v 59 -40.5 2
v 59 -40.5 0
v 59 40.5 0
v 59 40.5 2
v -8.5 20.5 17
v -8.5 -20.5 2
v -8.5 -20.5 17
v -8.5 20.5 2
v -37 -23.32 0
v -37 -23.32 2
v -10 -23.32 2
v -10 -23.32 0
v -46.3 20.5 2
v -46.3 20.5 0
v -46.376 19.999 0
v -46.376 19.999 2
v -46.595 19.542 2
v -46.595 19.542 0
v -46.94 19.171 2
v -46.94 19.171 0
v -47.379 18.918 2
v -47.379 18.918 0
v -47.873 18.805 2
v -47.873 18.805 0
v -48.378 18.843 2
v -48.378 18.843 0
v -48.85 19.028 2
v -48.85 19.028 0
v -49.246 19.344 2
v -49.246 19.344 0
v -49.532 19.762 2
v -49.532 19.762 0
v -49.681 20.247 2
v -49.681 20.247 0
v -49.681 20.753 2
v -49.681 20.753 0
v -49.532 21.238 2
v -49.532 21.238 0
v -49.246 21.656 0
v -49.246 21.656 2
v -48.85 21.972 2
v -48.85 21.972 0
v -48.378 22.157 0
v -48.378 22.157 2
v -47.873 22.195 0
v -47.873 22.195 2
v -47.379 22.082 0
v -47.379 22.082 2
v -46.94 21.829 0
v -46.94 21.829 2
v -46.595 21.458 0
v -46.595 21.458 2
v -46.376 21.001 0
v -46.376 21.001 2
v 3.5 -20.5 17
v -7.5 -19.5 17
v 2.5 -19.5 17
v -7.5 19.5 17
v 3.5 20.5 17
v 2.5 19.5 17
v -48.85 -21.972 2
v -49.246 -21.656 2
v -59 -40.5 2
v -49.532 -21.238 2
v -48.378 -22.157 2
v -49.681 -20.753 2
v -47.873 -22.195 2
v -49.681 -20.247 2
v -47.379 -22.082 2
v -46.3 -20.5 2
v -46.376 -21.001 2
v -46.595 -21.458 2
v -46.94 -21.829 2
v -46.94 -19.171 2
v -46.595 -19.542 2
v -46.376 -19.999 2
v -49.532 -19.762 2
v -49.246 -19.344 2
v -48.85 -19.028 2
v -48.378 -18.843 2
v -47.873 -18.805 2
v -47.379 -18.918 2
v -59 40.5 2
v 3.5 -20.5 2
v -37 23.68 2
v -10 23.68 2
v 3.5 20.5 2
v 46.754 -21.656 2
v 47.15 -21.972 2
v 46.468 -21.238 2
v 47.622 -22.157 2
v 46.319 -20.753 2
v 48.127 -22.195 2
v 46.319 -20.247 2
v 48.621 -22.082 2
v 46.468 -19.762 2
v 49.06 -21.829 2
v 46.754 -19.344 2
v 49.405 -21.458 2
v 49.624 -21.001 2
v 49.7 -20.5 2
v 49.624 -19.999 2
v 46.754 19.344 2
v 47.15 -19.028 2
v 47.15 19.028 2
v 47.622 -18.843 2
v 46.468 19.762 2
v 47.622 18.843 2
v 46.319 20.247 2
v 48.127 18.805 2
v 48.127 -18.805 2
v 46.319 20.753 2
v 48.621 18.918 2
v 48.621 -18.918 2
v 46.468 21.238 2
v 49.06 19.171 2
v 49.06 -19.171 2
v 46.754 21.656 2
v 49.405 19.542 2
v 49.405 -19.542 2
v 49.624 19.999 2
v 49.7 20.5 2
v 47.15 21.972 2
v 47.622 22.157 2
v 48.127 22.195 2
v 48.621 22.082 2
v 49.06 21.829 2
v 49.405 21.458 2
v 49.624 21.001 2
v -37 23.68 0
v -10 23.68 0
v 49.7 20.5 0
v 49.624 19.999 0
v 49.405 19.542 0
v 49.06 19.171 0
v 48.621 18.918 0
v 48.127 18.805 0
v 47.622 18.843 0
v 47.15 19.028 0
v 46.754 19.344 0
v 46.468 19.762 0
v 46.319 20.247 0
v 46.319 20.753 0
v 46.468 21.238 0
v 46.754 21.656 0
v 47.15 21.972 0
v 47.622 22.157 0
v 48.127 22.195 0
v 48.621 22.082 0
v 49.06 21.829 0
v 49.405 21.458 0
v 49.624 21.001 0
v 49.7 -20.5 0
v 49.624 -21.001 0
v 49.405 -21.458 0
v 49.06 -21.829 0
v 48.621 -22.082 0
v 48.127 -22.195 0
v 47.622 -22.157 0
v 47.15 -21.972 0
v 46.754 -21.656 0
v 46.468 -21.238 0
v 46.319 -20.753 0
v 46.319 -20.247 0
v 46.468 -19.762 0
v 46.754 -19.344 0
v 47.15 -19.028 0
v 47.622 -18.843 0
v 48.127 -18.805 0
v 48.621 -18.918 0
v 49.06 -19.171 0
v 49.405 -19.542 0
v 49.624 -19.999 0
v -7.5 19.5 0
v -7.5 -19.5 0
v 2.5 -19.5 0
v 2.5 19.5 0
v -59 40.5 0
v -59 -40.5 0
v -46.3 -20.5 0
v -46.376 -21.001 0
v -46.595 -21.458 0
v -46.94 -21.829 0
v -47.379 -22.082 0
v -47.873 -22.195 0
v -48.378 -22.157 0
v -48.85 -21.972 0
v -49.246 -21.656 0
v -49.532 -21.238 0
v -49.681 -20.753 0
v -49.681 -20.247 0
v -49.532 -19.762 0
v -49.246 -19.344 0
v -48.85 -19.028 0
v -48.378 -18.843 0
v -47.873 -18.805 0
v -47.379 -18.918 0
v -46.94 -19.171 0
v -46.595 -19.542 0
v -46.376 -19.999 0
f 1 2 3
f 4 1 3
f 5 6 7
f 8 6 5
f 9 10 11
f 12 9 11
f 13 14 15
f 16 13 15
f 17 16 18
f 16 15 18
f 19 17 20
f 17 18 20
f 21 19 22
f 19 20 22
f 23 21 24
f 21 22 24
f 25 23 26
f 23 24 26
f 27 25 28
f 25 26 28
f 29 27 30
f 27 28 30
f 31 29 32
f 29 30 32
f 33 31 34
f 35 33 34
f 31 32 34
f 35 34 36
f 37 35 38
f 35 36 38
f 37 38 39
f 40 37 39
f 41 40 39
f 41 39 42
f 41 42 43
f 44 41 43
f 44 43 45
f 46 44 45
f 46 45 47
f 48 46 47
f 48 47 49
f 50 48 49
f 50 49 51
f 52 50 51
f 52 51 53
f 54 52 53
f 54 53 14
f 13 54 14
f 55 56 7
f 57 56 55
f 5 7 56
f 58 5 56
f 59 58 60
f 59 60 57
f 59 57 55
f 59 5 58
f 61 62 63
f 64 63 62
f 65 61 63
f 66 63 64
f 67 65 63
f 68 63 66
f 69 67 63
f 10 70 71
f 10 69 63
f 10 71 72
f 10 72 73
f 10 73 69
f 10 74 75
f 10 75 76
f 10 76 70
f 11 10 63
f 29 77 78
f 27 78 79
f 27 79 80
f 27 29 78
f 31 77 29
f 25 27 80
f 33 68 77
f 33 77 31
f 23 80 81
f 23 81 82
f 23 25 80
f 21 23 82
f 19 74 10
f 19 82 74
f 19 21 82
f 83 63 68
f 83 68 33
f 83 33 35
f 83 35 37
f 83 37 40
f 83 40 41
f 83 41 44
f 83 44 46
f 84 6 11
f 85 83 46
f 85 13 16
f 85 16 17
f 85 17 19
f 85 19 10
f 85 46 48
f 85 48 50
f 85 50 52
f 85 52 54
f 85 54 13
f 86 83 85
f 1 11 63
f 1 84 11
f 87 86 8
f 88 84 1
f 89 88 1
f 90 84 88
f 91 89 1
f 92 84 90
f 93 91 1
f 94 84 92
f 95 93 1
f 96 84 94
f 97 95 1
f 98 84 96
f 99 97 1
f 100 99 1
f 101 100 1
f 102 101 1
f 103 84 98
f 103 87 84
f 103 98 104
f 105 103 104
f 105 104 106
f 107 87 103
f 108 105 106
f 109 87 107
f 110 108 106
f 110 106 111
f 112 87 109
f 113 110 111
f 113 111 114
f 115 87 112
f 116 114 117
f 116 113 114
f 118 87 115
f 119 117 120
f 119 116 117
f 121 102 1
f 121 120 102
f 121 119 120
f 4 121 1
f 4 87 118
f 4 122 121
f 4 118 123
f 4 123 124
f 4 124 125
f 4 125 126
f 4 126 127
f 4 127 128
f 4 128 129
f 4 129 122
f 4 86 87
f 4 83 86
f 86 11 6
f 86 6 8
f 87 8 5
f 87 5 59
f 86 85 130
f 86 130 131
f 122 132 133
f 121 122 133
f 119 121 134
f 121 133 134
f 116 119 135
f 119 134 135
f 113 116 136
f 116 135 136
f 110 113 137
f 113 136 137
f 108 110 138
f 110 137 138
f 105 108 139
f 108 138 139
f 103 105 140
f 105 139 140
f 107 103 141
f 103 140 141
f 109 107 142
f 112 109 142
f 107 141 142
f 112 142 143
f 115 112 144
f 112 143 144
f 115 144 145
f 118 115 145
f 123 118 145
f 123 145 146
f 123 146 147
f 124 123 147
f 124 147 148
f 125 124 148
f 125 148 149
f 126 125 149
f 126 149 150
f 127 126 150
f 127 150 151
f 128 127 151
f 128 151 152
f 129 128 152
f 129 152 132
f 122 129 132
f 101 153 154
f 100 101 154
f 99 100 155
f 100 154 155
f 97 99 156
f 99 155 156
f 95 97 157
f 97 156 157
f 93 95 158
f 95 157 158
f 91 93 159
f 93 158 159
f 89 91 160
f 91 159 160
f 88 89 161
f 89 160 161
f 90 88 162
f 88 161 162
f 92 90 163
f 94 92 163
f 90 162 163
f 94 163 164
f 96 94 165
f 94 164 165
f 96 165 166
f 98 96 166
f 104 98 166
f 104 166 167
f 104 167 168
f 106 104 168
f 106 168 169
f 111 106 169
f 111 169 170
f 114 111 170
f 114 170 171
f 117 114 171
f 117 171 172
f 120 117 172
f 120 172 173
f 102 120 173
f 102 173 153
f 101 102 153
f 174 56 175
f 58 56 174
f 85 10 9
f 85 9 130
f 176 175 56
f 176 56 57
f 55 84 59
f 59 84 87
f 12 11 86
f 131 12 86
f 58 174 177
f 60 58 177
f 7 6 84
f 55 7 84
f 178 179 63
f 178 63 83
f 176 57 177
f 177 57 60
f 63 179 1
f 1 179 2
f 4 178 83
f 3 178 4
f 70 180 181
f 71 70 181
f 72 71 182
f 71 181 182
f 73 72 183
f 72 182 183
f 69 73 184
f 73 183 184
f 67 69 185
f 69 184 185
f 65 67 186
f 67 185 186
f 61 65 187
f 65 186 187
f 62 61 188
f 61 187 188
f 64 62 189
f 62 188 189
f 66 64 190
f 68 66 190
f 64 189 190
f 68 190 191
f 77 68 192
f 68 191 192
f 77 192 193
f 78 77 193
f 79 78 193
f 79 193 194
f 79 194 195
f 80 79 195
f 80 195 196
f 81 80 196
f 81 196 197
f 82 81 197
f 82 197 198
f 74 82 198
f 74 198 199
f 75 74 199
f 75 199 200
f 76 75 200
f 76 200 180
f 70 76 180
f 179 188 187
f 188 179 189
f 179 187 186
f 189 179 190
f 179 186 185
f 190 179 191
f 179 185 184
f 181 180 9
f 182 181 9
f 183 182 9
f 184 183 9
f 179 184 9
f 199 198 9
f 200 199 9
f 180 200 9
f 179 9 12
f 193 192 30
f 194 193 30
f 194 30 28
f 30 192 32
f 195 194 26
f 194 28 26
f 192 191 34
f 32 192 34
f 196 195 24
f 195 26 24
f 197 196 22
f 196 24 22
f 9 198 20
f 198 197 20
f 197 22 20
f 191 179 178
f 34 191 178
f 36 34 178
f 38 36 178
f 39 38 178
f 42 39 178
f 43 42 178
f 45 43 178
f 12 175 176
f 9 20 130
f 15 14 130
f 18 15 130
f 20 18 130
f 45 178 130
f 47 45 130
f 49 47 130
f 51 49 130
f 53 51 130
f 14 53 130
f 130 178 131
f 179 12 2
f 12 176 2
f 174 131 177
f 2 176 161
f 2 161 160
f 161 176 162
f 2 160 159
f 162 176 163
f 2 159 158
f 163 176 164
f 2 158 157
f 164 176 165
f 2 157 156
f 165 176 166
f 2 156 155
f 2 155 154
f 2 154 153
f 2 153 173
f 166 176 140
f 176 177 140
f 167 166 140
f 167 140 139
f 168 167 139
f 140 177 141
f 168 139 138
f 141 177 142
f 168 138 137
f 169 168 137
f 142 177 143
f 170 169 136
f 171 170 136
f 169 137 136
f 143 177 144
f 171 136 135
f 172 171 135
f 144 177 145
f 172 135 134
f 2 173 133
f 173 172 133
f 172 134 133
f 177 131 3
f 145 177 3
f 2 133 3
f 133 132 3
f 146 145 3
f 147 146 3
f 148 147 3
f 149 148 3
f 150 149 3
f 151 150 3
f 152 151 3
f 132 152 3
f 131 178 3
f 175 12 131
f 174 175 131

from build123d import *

# Parameters (mm, degrees)
SKETCH_W        = 118
SKETCH_H        = 81
PAD_DEPTH       = 2
SKETCH001_R     = 1.7
HOLE_DEPTH      = 25
SKETCH002_W     = 12
SKETCH002_H     = 41
PAD001_DEPTH    = 15
SKETCH003_W     = 10
SKETCH003_H     = 39
POCKET_DEPTH    = 17.001
SKETCH004_W     = 27
SKETCH004_H     = 47
POCKET001_DEPTH = 5


with BuildPart() as part:
    # Sketch → Pad (new body)
    with BuildSketch(Plane.XY):
        Rectangle(SKETCH_W, SKETCH_H)
    extrude(amount=PAD_DEPTH)

    # Sketch001 (on Face5 of Pad) → Hole (cut)
    with BuildSketch(Plane(origin=(0, 0, 0), x_dir=(1, 0, 0), z_dir=(0, 0, -1))):
        with Locations((-48, 20.5)):
            Circle(SKETCH001_R)
        with Locations((-48, -20.5)):
            Circle(SKETCH001_R)
        with Locations((48, 20.5)):
            Circle(SKETCH001_R)
        with Locations((48, -20.5)):
            Circle(SKETCH001_R)
    extrude(amount=-HOLE_DEPTH, mode=Mode.SUBTRACT)

    # Sketch002 (on Face5 of Hole) → Pad001 (join)
    with BuildSketch(Plane.XY.offset(2)):
        with Locations((-2.5, 0)):
            Rectangle(SKETCH002_W, SKETCH002_H)
    extrude(amount=PAD001_DEPTH)

    # Sketch003 (on Face15 of Pad001) → Pocket (cut, through all)
    with BuildSketch(Plane.XY.offset(17)):
        with Locations((-2.5, 0)):
            Rectangle(SKETCH003_W, SKETCH003_H)
    extrude(amount=-POCKET_DEPTH, mode=Mode.SUBTRACT)

    # Sketch004 (on Face5 of Pocket) → Pocket001 (cut)
    with BuildSketch(Plane.XY.offset(2)):
        with Locations((-23.5, 0.180496)):
            Rectangle(SKETCH004_W, SKETCH004_H)
    extrude(amount=-POCKET001_DEPTH, mode=Mode.SUBTRACT)


solid = part.part
